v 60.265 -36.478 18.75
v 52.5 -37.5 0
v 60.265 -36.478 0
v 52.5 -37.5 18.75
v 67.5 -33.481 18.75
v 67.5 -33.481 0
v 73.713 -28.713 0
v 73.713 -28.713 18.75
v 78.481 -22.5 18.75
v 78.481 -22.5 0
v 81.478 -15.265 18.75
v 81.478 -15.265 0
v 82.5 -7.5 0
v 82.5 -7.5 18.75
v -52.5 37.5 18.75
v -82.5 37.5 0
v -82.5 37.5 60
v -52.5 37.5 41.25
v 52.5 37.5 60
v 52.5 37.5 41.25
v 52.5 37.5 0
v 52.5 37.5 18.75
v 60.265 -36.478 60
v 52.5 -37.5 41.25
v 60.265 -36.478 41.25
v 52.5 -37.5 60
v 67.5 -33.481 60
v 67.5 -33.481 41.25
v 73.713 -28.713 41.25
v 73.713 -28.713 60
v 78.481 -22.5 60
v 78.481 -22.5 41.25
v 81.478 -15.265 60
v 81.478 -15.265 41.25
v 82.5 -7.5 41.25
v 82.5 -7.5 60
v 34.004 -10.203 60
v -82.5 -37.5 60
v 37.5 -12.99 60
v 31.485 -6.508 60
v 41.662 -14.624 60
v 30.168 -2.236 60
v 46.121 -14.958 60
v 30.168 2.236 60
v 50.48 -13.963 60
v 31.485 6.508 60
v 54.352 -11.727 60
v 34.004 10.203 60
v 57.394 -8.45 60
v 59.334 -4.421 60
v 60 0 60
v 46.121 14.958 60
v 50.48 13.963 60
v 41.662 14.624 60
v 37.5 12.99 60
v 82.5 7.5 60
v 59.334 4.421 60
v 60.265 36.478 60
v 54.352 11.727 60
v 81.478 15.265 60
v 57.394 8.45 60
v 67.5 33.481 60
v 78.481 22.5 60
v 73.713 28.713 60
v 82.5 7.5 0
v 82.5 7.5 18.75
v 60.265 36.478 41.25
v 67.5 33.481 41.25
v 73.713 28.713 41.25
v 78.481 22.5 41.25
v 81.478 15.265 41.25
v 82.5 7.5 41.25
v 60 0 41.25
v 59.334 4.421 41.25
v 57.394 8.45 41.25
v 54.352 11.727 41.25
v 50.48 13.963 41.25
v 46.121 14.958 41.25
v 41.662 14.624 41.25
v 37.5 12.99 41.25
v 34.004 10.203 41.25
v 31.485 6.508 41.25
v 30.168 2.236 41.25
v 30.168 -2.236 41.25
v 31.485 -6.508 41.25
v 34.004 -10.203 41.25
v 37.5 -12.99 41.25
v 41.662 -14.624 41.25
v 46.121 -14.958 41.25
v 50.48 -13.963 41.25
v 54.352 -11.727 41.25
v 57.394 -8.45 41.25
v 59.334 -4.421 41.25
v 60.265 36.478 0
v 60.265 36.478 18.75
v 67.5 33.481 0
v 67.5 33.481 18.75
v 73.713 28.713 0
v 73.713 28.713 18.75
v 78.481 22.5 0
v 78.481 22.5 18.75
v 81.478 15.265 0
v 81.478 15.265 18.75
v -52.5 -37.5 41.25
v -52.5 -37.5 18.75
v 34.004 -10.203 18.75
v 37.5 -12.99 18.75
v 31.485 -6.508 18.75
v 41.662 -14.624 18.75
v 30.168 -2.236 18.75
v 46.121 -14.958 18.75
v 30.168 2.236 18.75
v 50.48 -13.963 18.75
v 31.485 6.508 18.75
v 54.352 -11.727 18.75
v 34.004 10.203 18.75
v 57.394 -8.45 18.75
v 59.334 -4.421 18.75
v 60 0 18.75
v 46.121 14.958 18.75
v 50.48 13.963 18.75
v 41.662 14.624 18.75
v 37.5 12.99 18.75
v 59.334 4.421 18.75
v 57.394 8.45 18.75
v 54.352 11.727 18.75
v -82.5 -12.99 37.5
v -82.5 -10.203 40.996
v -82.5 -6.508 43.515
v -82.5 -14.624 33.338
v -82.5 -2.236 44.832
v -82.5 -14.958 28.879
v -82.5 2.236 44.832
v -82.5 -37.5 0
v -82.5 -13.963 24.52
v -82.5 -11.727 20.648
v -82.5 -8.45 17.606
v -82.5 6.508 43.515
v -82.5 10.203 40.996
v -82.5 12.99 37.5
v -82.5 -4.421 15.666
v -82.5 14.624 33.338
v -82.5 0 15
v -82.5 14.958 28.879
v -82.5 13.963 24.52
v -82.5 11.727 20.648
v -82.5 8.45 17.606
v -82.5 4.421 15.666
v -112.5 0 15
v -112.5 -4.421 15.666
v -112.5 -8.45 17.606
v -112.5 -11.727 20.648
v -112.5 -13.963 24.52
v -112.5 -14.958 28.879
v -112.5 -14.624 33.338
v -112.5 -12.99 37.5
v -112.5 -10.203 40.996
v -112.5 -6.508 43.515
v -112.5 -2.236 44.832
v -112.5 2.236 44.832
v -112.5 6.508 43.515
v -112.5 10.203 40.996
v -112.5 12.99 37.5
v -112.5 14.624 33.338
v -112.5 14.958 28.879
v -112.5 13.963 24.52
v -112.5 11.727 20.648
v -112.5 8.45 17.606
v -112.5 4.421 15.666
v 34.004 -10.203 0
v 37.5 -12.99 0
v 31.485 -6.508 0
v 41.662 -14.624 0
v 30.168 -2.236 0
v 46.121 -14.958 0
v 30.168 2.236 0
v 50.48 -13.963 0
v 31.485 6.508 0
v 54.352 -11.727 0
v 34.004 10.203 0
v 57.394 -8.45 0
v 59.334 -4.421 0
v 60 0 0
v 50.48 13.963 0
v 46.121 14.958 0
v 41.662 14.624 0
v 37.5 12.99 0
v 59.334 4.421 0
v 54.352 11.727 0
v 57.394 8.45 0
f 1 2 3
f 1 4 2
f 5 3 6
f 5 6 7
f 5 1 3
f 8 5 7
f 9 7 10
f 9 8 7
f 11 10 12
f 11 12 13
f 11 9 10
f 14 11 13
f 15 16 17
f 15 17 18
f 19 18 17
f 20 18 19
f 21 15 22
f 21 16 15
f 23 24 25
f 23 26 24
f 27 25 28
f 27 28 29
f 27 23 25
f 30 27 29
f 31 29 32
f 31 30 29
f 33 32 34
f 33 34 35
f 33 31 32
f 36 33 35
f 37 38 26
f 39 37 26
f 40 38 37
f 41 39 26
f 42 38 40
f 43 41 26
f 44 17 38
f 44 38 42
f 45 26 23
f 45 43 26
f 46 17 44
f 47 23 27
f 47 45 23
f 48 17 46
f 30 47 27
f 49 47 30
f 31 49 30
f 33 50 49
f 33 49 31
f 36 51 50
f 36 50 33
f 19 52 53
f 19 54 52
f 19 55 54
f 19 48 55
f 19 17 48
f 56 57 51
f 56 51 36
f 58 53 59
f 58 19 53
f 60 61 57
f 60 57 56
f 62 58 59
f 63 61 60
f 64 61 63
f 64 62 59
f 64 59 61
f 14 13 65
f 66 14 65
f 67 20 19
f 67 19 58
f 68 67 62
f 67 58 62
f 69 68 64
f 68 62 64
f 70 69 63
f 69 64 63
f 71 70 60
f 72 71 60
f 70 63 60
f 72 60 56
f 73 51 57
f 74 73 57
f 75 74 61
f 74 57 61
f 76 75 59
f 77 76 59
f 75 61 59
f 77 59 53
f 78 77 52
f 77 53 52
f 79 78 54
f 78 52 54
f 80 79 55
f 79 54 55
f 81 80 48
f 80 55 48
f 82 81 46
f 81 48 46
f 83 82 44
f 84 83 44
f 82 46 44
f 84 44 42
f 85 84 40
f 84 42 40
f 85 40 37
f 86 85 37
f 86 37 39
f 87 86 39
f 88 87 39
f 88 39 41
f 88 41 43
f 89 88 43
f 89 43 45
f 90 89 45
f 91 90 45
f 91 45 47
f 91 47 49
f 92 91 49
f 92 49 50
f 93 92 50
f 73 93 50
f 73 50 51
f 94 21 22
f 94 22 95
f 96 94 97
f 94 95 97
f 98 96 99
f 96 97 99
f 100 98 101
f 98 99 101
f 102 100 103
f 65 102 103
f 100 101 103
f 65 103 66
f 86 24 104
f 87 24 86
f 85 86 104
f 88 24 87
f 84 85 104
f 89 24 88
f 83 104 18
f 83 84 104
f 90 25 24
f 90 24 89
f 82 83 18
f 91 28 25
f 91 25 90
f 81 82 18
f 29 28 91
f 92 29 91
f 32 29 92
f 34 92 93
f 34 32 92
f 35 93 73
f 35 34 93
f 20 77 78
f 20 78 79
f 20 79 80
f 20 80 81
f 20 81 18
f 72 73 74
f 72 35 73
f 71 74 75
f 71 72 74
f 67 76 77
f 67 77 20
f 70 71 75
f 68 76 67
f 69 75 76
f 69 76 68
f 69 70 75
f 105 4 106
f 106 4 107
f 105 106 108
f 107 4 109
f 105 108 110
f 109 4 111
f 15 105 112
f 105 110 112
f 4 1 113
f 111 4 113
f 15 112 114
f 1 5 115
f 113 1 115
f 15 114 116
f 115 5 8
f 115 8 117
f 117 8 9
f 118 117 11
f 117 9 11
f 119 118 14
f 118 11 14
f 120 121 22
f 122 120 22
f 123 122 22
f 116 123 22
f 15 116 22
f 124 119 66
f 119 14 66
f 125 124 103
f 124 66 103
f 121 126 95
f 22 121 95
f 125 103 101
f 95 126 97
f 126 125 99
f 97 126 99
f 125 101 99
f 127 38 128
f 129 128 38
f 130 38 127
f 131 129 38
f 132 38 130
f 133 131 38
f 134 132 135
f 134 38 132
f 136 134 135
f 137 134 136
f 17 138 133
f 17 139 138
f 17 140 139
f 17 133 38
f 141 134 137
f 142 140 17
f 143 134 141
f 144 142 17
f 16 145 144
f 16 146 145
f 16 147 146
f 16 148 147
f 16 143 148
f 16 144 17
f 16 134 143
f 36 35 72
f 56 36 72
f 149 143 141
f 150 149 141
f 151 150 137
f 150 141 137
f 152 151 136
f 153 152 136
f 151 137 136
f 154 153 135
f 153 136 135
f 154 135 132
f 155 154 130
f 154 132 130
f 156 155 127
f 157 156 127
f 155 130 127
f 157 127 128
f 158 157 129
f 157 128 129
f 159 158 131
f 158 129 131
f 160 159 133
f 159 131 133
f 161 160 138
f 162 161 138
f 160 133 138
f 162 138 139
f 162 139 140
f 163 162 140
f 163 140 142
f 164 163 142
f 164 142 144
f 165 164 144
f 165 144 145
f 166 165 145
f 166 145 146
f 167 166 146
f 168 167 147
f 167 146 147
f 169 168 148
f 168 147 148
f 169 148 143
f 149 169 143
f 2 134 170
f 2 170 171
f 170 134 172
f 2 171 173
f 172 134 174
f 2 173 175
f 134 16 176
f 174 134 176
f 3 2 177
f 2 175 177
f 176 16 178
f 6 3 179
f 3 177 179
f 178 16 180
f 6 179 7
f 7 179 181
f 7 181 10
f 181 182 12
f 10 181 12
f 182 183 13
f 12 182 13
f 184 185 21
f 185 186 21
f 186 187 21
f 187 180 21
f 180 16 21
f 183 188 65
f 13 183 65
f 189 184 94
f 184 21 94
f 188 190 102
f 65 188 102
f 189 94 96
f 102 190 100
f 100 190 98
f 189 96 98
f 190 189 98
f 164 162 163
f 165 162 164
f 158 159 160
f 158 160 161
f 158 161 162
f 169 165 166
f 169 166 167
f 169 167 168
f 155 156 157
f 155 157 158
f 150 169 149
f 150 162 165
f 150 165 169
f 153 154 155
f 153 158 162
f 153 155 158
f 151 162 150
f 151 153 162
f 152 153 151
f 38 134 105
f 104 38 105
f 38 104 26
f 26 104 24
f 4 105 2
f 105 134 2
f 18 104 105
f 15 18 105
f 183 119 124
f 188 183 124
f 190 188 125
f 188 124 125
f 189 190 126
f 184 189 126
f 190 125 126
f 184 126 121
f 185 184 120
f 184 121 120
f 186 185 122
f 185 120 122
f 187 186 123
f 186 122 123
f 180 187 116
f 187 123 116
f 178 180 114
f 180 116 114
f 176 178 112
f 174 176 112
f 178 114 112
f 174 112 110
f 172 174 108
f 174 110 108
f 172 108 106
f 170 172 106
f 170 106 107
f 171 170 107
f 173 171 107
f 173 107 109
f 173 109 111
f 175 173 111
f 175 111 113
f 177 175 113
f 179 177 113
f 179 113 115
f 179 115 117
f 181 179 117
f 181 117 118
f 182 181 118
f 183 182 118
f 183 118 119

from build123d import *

# Parameters (mm, degrees)
SKETCH1_W           = 165
SKETCH1_H           = 75
BOSS_EXTRUDE1_DEPTH = 60
SKETCH2_W           = 22.5
SKETCH2_H           = 75
CUT_EXTRUDE1_DEPTH  = 135
FILLET1_R           = 30
SKETCH3_R           = 15
CUT_EXTRUDE2_DEPTH  = 109.685325596
SKETCH4_R           = 15
BOSS_EXTRUDE2_DEPTH = 30


with BuildPart() as part:
    # Sketch1 → Boss-Extrude1 (new body)
    with BuildSketch(Plane.XY):
        Rectangle(SKETCH1_W, SKETCH1_H)
    extrude(amount=BOSS_EXTRUDE1_DEPTH)

    # Sketch2 → Cut-Extrude1 (cut)
    with BuildSketch(Plane(origin=(82.5, 0, 0), x_dir=(0, 0, -1), z_dir=(1, 0, 0))):
        with Locations((-30, 0)):
            Rectangle(SKETCH2_W, SKETCH2_H)
    extrude(amount=-CUT_EXTRUDE1_DEPTH, mode=Mode.SUBTRACT)

    # Fillet1
    fillet1_edges = [part.edges().sort_by_distance(p)[0] for p in [
        (82.5, -37.5, 9.375),
        (82.5, 37.5, 9.375),
        (82.5, 37.5, 50.625),
        (82.5, -37.5, 50.625),
    ]]
    fillet(fillet1_edges, radius=FILLET1_R)

    # Sketch3 → Cut-Extrude2 (cut, through all)
    with BuildSketch(Plane.XY.offset(60)):
        with Locations((45, 0)):
            Circle(SKETCH3_R)
    extrude(amount=-CUT_EXTRUDE2_DEPTH, mode=Mode.SUBTRACT)

    # Sketch4 → Boss-Extrude2 (add)
    with BuildSketch(Plane.ZY.offset(82.5)):
        with Locations(Location((30, 0, 0), (0, 0, 180))):
            Circle(SKETCH4_R)
    extrude(amount=BOSS_EXTRUDE2_DEPTH)


solid = part.part
